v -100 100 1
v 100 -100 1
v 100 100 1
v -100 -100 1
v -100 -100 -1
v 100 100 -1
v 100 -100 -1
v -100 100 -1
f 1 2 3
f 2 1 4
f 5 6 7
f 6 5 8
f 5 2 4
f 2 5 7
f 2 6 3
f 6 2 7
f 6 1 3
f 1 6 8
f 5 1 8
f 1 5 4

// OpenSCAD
$fn=64;

module sheet(size=[200,200,2], center=true){
    cube(size, center=center);
}

sheet();
